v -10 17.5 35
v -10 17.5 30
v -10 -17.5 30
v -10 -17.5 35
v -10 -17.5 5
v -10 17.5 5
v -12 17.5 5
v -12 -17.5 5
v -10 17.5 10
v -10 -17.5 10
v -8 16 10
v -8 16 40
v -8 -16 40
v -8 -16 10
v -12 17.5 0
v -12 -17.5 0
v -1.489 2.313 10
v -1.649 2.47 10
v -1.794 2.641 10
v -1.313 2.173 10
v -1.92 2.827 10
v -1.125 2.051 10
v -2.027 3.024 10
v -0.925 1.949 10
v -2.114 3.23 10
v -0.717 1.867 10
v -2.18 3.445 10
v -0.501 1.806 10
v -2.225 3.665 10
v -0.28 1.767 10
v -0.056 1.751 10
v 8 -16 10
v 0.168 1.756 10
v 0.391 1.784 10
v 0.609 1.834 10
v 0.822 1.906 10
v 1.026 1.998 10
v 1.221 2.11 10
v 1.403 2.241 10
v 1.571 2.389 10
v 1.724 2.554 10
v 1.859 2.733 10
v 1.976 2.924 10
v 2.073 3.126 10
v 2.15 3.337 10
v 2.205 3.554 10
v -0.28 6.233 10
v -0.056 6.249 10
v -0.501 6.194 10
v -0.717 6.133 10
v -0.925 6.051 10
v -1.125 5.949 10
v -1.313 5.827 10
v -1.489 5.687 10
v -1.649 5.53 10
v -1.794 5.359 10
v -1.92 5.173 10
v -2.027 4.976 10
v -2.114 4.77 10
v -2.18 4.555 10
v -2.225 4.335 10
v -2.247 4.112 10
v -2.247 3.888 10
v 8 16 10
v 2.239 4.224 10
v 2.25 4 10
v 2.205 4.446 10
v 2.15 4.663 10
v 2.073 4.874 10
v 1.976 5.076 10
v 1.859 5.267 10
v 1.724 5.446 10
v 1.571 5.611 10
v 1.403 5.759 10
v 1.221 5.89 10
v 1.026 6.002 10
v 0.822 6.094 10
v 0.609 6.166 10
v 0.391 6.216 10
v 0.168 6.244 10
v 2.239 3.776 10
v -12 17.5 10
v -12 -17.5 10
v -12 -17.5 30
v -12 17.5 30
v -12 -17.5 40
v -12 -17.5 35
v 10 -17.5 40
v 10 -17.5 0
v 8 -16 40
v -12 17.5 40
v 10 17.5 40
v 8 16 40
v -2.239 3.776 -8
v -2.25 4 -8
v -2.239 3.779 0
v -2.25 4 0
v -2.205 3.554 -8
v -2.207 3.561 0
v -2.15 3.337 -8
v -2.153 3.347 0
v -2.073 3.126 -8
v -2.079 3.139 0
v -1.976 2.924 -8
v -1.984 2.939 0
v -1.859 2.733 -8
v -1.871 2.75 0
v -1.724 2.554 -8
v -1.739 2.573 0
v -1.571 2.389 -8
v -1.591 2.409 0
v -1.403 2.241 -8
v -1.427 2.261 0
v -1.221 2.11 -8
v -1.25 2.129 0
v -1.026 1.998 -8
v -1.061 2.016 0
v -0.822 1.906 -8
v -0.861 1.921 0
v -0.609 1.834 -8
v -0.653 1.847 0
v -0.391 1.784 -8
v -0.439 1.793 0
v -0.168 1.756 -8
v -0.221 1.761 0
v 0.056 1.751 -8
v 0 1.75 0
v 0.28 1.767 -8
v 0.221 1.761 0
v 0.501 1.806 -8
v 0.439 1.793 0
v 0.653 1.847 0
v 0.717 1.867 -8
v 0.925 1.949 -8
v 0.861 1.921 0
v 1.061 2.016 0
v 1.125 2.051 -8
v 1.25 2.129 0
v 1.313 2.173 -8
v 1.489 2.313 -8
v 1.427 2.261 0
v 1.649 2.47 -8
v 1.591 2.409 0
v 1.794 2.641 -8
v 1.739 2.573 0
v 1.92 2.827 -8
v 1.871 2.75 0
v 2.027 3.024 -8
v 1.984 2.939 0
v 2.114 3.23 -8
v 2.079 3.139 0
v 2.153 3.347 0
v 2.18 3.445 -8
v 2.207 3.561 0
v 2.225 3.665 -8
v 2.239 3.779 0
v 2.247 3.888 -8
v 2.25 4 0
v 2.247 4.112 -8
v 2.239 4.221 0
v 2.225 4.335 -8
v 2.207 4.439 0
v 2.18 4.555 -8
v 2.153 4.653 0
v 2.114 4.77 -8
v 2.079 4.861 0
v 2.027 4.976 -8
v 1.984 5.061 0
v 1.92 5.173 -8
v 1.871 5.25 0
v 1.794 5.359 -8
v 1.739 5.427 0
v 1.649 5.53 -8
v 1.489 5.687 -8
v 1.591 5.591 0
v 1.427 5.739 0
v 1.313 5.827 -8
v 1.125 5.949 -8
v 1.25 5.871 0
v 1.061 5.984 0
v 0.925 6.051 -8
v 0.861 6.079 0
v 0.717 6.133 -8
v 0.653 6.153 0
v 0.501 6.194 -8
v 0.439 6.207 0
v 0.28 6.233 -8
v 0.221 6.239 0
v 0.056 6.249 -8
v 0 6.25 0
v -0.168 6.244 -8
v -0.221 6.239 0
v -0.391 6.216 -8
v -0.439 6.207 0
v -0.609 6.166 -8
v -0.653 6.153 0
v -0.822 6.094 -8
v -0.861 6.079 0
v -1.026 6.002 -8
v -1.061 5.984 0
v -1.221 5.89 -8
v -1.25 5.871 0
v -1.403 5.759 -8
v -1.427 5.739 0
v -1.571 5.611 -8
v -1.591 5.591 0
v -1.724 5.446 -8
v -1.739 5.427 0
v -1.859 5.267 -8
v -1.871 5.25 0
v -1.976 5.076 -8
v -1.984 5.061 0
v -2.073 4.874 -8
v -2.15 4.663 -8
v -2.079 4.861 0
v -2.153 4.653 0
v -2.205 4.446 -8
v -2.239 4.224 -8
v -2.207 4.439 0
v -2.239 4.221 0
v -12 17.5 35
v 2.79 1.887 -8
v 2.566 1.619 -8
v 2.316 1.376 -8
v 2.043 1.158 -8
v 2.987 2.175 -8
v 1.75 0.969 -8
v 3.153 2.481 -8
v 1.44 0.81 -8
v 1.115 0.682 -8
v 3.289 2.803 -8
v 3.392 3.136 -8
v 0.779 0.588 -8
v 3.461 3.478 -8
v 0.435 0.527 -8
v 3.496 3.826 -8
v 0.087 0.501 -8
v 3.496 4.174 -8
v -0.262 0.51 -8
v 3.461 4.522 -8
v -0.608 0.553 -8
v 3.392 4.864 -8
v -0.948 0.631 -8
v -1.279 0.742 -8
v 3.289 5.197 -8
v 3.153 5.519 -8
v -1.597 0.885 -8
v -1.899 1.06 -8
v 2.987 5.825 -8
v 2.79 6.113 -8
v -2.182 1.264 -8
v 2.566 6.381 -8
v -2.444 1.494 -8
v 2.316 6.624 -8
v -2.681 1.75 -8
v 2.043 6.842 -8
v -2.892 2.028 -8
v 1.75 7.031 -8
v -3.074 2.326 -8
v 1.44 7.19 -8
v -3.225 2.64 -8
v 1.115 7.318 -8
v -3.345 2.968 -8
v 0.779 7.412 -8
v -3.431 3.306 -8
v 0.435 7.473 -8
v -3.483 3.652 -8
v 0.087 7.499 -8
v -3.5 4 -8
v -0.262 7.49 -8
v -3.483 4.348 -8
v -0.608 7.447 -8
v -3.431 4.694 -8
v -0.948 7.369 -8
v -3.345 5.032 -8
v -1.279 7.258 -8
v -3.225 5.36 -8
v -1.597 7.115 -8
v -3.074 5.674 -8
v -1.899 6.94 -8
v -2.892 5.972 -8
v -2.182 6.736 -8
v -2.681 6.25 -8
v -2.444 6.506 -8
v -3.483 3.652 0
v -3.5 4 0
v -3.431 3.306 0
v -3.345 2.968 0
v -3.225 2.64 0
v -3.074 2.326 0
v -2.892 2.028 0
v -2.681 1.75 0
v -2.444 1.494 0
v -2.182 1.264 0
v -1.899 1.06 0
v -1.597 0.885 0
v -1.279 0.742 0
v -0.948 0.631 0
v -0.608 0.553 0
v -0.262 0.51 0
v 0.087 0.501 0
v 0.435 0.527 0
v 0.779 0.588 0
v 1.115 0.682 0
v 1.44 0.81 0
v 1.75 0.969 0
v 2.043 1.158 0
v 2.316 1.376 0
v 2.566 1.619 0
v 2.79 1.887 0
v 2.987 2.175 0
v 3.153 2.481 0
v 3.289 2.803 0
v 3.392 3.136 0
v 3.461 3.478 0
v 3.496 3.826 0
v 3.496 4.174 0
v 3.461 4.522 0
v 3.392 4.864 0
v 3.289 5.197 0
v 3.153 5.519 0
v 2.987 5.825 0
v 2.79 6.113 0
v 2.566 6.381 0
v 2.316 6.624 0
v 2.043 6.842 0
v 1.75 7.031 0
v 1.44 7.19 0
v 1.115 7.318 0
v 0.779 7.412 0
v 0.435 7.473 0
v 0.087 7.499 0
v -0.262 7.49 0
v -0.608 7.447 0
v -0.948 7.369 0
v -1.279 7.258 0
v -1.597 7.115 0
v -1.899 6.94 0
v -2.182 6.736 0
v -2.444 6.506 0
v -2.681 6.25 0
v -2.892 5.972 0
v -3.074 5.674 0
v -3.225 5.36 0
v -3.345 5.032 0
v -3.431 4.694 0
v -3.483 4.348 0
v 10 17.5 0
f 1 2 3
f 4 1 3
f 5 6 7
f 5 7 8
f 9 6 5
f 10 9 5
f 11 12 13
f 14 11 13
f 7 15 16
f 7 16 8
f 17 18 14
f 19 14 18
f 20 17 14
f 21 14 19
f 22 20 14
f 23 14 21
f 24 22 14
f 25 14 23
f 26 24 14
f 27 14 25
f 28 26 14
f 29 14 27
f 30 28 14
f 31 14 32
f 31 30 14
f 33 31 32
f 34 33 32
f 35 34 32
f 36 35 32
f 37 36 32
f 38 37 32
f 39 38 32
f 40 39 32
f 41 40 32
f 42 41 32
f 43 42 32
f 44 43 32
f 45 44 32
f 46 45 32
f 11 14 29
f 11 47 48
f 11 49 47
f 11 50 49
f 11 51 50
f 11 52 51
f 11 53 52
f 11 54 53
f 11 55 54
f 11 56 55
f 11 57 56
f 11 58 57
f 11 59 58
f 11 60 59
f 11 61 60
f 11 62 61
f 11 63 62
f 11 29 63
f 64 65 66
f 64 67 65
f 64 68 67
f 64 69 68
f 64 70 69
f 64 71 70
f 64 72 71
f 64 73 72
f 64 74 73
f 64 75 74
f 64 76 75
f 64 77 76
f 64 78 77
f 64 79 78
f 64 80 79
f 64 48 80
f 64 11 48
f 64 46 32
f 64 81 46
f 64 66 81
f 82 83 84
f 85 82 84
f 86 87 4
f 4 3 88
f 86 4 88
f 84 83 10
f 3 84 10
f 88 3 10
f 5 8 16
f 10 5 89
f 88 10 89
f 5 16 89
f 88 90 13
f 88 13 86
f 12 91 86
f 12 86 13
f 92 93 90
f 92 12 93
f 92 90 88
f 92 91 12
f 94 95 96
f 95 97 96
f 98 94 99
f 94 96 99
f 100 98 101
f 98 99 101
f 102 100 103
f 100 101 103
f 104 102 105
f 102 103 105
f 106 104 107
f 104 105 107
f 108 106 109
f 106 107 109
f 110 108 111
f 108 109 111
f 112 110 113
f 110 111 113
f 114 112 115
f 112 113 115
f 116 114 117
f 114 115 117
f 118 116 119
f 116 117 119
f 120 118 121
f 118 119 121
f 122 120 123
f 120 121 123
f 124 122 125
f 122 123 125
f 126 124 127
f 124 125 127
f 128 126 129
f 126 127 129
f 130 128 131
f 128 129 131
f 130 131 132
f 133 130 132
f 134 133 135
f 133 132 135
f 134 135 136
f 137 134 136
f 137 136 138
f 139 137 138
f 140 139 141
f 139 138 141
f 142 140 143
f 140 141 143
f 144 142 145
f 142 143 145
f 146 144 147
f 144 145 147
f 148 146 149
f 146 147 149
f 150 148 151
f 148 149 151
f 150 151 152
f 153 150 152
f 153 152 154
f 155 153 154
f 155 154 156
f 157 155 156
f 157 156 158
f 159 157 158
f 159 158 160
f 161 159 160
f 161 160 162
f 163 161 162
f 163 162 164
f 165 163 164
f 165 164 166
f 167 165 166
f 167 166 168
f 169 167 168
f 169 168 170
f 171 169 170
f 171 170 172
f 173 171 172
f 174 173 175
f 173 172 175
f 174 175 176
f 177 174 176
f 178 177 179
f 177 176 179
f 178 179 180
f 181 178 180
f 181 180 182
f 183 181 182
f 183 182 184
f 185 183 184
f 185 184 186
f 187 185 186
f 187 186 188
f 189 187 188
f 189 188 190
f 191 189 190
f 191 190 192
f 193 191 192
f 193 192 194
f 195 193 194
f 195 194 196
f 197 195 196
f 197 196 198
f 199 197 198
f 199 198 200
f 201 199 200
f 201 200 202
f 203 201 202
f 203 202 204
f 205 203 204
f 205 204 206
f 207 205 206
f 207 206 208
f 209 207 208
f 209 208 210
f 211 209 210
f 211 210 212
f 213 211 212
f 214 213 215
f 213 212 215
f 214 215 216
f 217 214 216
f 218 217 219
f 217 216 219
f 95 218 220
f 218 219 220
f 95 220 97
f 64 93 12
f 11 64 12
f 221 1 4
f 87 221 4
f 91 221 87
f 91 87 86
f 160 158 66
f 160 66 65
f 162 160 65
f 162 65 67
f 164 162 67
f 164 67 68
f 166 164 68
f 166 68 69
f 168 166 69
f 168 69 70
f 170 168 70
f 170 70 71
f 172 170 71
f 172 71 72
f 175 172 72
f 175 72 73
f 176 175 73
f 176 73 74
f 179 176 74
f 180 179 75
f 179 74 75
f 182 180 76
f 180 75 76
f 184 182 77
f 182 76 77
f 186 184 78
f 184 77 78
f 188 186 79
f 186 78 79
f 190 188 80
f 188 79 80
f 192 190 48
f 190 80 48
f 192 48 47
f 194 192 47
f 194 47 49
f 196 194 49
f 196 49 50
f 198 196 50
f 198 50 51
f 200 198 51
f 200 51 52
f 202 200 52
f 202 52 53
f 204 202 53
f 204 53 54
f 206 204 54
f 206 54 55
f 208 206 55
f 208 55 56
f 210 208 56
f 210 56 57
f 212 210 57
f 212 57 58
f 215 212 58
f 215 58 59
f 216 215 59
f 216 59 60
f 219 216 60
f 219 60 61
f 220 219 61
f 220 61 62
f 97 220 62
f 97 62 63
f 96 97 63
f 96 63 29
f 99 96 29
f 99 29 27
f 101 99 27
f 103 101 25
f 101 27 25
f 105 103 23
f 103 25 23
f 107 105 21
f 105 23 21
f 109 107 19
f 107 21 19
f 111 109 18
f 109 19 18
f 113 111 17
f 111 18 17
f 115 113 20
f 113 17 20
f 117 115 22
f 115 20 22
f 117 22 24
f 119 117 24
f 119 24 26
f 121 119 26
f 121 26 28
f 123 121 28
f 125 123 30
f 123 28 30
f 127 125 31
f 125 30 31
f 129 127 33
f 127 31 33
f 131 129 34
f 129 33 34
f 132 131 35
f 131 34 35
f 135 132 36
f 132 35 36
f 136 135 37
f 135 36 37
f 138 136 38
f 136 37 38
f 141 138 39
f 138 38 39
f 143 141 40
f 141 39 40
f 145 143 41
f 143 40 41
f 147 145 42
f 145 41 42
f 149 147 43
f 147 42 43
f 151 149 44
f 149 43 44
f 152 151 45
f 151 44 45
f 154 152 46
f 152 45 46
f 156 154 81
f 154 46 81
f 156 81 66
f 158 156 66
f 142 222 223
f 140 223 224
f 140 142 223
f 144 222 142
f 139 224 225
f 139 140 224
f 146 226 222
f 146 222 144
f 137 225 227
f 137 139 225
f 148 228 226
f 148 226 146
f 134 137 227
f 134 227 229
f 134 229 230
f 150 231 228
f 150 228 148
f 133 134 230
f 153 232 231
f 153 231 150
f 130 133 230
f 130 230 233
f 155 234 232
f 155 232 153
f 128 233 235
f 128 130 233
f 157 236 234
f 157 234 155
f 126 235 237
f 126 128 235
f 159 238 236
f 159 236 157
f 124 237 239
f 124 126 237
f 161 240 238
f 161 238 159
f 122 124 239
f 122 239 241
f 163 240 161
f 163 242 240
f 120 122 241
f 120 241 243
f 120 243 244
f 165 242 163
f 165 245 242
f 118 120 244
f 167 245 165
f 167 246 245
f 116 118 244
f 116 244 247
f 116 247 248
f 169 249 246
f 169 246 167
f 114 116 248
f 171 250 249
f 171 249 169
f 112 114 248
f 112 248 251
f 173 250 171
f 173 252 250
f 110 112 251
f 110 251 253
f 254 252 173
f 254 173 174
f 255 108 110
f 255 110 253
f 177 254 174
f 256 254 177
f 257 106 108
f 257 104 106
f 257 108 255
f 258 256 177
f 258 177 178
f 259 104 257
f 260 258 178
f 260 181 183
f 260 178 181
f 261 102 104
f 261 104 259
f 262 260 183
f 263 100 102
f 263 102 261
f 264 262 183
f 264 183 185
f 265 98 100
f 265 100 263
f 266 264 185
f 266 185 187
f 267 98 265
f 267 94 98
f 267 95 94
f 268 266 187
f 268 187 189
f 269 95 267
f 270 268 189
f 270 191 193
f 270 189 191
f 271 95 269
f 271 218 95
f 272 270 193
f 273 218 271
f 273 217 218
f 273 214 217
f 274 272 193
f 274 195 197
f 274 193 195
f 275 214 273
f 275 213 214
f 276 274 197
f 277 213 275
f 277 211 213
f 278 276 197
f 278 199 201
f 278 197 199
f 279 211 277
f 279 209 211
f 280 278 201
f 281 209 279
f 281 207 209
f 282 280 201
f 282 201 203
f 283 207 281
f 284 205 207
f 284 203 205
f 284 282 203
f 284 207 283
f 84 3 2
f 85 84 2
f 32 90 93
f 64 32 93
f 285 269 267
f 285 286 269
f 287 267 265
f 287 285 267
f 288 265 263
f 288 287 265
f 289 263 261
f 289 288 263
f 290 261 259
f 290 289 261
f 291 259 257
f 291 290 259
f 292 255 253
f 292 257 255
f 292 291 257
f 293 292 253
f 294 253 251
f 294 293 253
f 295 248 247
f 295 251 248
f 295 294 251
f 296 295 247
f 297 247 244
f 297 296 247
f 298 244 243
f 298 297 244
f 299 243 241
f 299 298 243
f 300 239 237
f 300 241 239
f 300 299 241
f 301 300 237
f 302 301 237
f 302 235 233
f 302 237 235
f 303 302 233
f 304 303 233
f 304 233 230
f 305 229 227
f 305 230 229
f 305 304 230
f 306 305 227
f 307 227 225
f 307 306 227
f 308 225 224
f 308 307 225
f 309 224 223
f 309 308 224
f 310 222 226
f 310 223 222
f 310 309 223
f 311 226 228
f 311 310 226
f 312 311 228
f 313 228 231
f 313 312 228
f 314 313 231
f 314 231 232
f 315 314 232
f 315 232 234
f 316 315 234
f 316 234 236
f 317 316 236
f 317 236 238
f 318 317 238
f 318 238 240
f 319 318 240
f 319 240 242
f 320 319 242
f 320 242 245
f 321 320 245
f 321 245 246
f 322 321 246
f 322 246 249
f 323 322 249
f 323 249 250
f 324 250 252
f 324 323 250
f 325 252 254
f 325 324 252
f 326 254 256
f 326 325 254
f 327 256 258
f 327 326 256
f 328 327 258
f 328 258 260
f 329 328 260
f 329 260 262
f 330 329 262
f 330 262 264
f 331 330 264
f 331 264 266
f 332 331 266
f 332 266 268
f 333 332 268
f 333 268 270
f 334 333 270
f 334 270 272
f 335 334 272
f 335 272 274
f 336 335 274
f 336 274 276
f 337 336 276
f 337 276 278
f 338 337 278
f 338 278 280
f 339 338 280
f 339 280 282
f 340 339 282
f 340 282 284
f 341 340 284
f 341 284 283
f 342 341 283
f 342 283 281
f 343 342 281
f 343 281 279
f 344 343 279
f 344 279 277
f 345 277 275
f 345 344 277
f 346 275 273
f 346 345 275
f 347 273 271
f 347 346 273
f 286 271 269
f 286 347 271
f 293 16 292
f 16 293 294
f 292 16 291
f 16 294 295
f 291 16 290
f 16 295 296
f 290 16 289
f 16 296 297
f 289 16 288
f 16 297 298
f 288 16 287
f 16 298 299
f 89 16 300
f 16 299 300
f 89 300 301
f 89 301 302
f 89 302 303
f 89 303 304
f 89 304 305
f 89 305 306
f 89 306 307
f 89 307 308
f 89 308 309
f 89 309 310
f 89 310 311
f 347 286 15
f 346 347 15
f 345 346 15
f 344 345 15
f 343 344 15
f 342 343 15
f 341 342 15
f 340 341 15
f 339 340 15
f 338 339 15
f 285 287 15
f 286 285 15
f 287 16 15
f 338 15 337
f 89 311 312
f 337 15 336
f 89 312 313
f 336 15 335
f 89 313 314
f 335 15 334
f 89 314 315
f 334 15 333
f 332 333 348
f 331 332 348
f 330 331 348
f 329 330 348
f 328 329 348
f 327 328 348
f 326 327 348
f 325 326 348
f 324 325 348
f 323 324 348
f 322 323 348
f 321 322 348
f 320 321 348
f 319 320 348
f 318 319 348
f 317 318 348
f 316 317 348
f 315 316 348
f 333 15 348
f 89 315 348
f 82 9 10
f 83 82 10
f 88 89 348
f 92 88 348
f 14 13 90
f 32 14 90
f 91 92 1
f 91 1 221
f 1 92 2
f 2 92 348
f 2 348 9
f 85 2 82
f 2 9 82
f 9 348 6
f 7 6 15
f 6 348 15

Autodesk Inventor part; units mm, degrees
ref_plane "YZ Plane" through (0, 0, 0) normal (1, 0, 0) x (0, 1, 0)
ref_plane "XZ Plane" through (0, 0, 0) normal (0, 1, 0) x (-1, 0, 0)
ref_plane "XY Plane" through (0, 0, 0) normal (0, 0, 1) x (1, 0, 0)
sketch "Sketch1" plane through (0, 0, 0) normal (0, 0, 1) x (1, 0, 0)
  line L0 (-10, -17.5) -> (10, -17.5)
  line L1 (10, -17.5) -> (10, 17.5)
  line L2 (10, 17.5) -> (-10, 17.5)
  line L3 (-10, 17.5) -> (-10, -17.5)
  line L4 (-10, -17.5) -> (10, 17.5) construction
  line L5 (10, -17.5) -> (-10, 17.5) construction
  point P0 (0, 0)
  dimension "d0" = 20
  dimension "d1" = 35
extrude "Extrusion1" add sketch "Sketch1" along normal blind 40
sketch "Sketch2" plane through (0, 0, 40) normal (0, 0, 1) x (1, 0, 0)
  line L0 (-8, -16) -> (8, -16)
  line L1 (8, -16) -> (8, 16)
  line L2 (8, 16) -> (-8, 16)
  line L3 (-8, 16) -> (-8, -16)
  point P0 (0, 0)
  dimension "d4" = 16
  dimension "d5" = 32
extrude "Extrusion2" cut sketch "Sketch2" against normal blind 30
sketch "Sketch3" plane through (0, 0, 10) normal (0, 0, 1) x (1, 0, 0)
  line L0 (8, -16) -> (-8, -16) projected
  line L1 (8, 16) -> (8, -16) projected
  line L2 (-8, 16) -> (8, 16) projected
  line L3 (-8, -16) -> (-8, 16) projected
  point P0 (0, 0)
sketch "Sketch5" plane through (-10, -17.5, 0) normal (-1, 0, 0) x (0, 0, 1)
  line L0 (0, 35) -> (0, 0) projected
  line L1 (0, 0) -> (40, 0) projected
  line L2 (40, 35) -> (40, 0) projected
  line L3 (0, 35) -> (40, 35) projected
  point P0 (0, 17.5)
sketch "Sketch6" plane through (-10, -17.5, 0) normal (-1, 0, 0) x (0, 0, 1)
  line L0 (0, 35) -> (0, 0) projected
  line L1 (0, 0) -> (40, 0) projected
  line L2 (0, 35) -> (40, 35) projected
  line L3 (0, 35) -> (5, 35)
  line L4 (5, 35) -> (5, 0)
  line L5 (5, 0) -> (0, 0)
  line L6 (0, 0) -> (0, 35)
  line L7 (40, 35) -> (35, 35)
  line L8 (35, 35) -> (35, 0)
  line L9 (35, 0) -> (40, 0)
  line L10 (40, 0) -> (40, 35)
  line L11 (10, 0) -> (30, 0)
  line L12 (30, 0) -> (30, 35)
  line L13 (30, 35) -> (10, 35)
  line L14 (10, 35) -> (10, 0)
  point P0 (0, 17.5)
  dimension "d16" = 5
  dimension "d17" = 5
  dimension "d18" = 20
extrude "Extrusion3" add sketch "Sketch6" along normal blind 2 contours L2 L4 L1 L0 | L2 L12 L1 L14 | L2 L10 L1 L8
sketch "Sketch7" plane through (0, 0, 10) normal (0, 0, 1) x (1, 0, 0)
  circle A0 centre (0, 4) radius 2.25
  point P0 (0, 0)
  dimension "d21" = 4.5
extrude "Extrusion4" cut sketch "Sketch7" against normal through all
sketch "Sketch8" plane through (0, 0, 0) normal (0, 0, -1) x (-1, 0, 0)
  circle A0 centre (0, 4) radius 2.25 projected
  circle A1 centre (0, 4) radius 3.5
  point P0 (0, 0)
  dimension "d24" = 7
extrude "Extrusion5" add sketch "Sketch8" along normal blind 8
properties part number "atmos-pressure-end"
